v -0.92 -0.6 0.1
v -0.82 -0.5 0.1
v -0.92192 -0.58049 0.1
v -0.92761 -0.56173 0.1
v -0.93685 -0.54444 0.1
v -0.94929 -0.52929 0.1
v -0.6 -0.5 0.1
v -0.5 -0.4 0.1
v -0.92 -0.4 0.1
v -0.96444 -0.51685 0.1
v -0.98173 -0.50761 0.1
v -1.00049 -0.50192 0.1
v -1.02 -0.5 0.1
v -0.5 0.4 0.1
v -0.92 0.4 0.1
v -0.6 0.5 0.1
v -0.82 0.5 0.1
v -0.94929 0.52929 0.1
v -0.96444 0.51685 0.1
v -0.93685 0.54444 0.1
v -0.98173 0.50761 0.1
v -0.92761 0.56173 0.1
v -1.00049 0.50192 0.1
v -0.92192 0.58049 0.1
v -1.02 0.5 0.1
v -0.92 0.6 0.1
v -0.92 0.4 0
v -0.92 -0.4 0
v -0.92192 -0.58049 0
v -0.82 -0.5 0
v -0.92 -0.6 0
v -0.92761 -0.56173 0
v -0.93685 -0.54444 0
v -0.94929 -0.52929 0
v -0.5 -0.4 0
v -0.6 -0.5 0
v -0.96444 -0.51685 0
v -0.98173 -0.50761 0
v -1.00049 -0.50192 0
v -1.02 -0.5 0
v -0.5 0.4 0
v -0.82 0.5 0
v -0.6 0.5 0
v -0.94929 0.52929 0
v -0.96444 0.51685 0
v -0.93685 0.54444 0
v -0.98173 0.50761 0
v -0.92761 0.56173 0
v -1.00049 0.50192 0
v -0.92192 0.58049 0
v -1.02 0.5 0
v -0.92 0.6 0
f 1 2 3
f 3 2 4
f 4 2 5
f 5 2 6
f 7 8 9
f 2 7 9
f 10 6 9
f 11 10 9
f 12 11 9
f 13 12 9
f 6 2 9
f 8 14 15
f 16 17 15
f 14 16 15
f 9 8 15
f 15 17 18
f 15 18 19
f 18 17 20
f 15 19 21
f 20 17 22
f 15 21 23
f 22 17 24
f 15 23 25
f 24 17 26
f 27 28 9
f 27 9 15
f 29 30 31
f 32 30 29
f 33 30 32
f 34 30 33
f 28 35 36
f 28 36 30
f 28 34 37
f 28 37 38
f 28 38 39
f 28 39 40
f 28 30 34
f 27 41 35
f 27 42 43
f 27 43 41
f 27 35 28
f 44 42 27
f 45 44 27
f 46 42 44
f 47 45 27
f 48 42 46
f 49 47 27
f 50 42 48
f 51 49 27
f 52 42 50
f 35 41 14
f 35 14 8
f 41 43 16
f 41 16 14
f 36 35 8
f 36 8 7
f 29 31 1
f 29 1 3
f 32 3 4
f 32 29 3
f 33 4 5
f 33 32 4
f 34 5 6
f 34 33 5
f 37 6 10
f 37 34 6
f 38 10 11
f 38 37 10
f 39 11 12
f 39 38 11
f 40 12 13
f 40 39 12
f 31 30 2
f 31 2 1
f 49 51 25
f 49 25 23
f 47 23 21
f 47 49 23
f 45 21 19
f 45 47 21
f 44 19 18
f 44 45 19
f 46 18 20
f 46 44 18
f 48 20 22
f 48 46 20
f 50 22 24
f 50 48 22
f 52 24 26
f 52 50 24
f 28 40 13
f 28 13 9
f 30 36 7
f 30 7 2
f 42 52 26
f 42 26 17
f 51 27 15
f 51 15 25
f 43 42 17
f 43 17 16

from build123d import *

# Parameters (mm, degrees)
PAD_DEPTH = 0.1


with BuildPart() as part:
    # Sketch → Pad (new body)
    with BuildSketch(Plane.XY):
        with BuildLine():
            Line((-0.5, 0.4), (-0.5, -0.4))
            Line((-0.5, -0.4), (-0.6, -0.5))
            Line((-0.6, -0.5), (-0.82, -0.5))
            Line((-0.82, -0.5), (-0.92, -0.6))
            ThreePointArc((-0.92, -0.6), (-0.949289, -0.529289), (-1.02, -0.5))
            Line((-1.02, -0.5), (-0.92, -0.4))
            Line((-0.92, -0.4), (-0.92, 0.4))
            Line((-0.92, 0.4), (-1.02, 0.5))
            ThreePointArc((-1.02, 0.5), (-0.949289, 0.529289), (-0.92, 0.6))
            Line((-0.92, 0.6), (-0.82, 0.5))
            Line((-0.82, 0.5), (-0.6, 0.5))
            Line((-0.6, 0.5), (-0.5, 0.4))
        make_face()
    extrude(amount=PAD_DEPTH)


solid = part.part
